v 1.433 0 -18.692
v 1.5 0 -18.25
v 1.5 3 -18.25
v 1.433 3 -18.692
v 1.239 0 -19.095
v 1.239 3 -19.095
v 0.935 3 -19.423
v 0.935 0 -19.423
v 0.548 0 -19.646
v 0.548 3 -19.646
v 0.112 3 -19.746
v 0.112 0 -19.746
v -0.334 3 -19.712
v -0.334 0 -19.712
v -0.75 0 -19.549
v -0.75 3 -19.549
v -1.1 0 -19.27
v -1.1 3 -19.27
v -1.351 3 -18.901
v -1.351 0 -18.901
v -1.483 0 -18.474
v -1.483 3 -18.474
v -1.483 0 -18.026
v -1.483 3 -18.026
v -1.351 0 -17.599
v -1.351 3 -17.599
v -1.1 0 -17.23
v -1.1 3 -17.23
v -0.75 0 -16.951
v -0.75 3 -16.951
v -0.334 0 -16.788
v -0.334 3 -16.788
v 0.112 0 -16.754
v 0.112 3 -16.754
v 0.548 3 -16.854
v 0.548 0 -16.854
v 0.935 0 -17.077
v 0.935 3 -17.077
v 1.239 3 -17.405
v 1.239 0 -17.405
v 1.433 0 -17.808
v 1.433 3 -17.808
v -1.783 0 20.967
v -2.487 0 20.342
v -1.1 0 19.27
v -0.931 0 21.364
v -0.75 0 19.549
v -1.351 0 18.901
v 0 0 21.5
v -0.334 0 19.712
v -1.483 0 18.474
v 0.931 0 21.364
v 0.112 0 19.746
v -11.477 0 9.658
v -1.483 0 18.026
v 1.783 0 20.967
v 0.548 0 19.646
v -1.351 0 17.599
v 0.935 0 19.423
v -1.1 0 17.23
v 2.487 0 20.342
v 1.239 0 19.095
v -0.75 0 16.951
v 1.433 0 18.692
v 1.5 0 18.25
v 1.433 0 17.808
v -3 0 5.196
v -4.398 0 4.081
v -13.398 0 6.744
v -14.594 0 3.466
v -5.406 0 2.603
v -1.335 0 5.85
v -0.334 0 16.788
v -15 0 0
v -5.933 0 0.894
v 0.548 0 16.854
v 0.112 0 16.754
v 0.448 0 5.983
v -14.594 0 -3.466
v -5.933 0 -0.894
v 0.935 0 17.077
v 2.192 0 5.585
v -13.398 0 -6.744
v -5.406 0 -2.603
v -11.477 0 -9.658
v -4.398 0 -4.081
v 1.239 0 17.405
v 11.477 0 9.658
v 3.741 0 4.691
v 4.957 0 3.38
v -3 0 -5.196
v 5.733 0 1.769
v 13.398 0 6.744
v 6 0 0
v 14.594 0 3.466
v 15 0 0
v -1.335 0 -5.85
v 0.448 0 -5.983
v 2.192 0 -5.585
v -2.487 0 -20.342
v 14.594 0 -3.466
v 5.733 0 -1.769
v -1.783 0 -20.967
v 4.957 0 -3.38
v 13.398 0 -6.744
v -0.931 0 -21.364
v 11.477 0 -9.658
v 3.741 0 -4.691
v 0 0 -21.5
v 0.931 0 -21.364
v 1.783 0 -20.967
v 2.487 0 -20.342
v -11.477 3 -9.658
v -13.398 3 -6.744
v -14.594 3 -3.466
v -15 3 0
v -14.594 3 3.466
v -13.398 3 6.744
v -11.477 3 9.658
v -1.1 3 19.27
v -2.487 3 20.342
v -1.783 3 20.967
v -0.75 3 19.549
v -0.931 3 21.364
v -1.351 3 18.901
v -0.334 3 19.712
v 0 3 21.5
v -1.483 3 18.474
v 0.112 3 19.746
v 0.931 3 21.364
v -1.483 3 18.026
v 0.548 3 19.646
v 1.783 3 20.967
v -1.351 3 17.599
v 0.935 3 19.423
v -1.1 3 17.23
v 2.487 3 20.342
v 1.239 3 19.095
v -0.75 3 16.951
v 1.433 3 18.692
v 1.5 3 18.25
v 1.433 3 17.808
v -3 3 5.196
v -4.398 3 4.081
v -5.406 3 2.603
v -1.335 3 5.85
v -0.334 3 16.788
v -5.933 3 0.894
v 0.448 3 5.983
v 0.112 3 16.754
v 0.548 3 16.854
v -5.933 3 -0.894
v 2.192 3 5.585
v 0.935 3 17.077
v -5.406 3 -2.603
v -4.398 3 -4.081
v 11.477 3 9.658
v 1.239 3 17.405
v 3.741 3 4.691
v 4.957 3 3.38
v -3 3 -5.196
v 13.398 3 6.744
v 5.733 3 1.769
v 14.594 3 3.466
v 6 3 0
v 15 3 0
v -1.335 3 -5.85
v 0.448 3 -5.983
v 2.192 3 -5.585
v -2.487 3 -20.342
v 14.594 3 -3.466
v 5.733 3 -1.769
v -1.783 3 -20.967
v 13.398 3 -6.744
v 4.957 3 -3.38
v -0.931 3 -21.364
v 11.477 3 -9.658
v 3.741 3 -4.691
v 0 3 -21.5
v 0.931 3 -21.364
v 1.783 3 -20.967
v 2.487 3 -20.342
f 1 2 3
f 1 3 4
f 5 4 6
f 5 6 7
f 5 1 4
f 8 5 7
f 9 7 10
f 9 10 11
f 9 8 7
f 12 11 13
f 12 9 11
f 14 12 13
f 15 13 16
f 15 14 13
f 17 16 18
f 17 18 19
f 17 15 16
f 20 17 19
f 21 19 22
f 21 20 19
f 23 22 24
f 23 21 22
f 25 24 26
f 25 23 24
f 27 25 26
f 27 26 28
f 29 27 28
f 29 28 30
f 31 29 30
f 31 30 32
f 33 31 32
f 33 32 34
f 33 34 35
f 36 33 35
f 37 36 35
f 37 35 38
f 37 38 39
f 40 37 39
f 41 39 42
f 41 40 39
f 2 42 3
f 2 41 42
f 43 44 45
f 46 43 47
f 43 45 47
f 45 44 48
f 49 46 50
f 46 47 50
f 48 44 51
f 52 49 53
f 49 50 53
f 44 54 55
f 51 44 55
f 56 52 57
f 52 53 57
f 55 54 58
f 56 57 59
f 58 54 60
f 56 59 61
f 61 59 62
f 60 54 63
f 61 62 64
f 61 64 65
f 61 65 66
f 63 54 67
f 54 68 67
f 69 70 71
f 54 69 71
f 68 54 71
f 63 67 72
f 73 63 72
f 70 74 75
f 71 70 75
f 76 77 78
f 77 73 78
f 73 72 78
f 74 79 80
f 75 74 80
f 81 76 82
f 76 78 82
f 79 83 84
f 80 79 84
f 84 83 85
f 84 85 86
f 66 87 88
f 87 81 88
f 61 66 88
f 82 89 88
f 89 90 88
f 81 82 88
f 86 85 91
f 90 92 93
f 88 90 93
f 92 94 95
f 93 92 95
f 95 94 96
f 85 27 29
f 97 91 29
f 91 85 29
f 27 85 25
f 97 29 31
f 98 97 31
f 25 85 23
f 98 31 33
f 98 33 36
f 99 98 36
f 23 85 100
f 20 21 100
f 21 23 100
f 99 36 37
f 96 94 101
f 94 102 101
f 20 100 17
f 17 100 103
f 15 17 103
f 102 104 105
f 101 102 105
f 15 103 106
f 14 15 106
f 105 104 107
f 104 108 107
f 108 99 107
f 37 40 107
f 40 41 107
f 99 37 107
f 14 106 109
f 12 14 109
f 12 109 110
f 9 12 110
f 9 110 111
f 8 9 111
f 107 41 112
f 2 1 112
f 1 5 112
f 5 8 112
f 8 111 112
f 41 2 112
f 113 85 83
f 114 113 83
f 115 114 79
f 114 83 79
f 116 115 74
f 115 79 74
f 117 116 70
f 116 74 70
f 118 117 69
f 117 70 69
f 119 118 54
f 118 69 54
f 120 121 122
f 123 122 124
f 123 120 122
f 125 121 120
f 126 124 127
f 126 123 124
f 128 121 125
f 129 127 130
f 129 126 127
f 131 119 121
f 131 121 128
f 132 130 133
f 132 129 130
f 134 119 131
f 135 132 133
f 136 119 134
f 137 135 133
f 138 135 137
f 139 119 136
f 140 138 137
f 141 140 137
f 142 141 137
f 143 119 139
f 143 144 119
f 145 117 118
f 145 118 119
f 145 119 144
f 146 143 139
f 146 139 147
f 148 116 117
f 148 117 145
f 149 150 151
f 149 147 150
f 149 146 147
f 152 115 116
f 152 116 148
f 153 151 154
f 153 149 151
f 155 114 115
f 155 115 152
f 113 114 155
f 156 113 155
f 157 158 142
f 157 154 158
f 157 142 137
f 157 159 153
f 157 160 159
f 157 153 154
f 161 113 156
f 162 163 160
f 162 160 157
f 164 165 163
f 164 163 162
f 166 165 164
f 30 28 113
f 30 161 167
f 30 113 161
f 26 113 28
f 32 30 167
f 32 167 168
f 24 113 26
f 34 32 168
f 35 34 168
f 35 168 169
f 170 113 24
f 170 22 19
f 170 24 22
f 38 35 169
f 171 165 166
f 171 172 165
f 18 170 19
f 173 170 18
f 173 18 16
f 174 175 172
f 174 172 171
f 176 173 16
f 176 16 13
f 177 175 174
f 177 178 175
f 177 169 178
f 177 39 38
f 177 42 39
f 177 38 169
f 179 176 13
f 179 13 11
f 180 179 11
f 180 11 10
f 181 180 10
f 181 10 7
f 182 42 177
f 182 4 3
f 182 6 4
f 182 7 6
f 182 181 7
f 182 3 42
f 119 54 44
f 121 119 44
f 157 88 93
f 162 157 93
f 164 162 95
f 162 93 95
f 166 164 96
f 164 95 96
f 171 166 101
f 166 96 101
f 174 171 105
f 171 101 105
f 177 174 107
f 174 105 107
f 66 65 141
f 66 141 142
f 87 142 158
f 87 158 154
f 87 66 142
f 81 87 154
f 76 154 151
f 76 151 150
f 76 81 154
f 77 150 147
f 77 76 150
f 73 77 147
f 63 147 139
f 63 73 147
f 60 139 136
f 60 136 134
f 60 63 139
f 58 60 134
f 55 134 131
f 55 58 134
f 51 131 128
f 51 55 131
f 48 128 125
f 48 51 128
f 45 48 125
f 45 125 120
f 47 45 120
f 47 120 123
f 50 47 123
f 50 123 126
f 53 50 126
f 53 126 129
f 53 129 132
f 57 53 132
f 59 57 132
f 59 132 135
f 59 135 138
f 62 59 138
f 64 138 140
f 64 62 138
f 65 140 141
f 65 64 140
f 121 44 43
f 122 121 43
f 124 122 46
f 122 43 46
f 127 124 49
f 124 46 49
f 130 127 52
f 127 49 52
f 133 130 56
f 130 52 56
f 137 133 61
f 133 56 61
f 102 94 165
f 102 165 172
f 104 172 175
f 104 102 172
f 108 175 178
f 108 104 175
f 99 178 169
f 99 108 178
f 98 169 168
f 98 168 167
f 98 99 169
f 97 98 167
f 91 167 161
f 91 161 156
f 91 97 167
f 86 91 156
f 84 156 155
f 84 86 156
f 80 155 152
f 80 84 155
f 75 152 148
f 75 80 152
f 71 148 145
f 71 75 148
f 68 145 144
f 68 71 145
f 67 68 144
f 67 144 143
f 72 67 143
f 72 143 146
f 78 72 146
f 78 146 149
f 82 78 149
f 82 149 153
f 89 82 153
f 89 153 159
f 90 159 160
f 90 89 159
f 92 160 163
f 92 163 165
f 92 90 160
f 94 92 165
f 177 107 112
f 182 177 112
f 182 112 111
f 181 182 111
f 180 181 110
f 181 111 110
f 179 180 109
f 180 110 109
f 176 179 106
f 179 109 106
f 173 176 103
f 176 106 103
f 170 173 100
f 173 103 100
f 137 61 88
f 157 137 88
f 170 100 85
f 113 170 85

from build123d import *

# Parameters (mm, degrees)
SKETCH1_R           = 1.5
SKETCH1_R_2         = 6
BOSS_EXTRUDE1_DEPTH = 3


with BuildPart() as part:
    # Sketch1 → Boss-Extrude1 (new body)
    with BuildSketch(Plane(origin=(0, 0, 0), x_dir=(1, 0, 0), z_dir=(0, 1, 0))):
        with BuildLine():
            Line((-11.47745757, -9.657534247), (-2.486782474, -20.342465753))
            ThreePointArc((-2.486782474, -20.342465753), (0, -21.5), (2.486782474, -20.342465753))
            Line((2.486782474, -20.342465753), (11.47745757, -9.657534247))
            ThreePointArc((11.47745757, -9.657534247), (15, 0), (11.47745757, 9.657534247))
            Line((11.47745757, 9.657534247), (2.486782474, 20.342465753))
            ThreePointArc((2.486782474, 20.342465753), (0, 21.5), (-2.486782474, 20.342465753))
            Line((-2.486782474, 20.342465753), (-11.47745757, 9.657534247))
            ThreePointArc((-11.47745757, 9.657534247), (-15, 0), (-11.47745757, -9.657534247))
        make_face()
        with Locations((0, -18.25)):
            Circle(SKETCH1_R, mode=Mode.SUBTRACT)
        Circle(SKETCH1_R_2, mode=Mode.SUBTRACT)
        with Locations((0, 18.25)):
            Circle(SKETCH1_R, mode=Mode.SUBTRACT)
    extrude(amount=BOSS_EXTRUDE1_DEPTH)


solid = part.part
